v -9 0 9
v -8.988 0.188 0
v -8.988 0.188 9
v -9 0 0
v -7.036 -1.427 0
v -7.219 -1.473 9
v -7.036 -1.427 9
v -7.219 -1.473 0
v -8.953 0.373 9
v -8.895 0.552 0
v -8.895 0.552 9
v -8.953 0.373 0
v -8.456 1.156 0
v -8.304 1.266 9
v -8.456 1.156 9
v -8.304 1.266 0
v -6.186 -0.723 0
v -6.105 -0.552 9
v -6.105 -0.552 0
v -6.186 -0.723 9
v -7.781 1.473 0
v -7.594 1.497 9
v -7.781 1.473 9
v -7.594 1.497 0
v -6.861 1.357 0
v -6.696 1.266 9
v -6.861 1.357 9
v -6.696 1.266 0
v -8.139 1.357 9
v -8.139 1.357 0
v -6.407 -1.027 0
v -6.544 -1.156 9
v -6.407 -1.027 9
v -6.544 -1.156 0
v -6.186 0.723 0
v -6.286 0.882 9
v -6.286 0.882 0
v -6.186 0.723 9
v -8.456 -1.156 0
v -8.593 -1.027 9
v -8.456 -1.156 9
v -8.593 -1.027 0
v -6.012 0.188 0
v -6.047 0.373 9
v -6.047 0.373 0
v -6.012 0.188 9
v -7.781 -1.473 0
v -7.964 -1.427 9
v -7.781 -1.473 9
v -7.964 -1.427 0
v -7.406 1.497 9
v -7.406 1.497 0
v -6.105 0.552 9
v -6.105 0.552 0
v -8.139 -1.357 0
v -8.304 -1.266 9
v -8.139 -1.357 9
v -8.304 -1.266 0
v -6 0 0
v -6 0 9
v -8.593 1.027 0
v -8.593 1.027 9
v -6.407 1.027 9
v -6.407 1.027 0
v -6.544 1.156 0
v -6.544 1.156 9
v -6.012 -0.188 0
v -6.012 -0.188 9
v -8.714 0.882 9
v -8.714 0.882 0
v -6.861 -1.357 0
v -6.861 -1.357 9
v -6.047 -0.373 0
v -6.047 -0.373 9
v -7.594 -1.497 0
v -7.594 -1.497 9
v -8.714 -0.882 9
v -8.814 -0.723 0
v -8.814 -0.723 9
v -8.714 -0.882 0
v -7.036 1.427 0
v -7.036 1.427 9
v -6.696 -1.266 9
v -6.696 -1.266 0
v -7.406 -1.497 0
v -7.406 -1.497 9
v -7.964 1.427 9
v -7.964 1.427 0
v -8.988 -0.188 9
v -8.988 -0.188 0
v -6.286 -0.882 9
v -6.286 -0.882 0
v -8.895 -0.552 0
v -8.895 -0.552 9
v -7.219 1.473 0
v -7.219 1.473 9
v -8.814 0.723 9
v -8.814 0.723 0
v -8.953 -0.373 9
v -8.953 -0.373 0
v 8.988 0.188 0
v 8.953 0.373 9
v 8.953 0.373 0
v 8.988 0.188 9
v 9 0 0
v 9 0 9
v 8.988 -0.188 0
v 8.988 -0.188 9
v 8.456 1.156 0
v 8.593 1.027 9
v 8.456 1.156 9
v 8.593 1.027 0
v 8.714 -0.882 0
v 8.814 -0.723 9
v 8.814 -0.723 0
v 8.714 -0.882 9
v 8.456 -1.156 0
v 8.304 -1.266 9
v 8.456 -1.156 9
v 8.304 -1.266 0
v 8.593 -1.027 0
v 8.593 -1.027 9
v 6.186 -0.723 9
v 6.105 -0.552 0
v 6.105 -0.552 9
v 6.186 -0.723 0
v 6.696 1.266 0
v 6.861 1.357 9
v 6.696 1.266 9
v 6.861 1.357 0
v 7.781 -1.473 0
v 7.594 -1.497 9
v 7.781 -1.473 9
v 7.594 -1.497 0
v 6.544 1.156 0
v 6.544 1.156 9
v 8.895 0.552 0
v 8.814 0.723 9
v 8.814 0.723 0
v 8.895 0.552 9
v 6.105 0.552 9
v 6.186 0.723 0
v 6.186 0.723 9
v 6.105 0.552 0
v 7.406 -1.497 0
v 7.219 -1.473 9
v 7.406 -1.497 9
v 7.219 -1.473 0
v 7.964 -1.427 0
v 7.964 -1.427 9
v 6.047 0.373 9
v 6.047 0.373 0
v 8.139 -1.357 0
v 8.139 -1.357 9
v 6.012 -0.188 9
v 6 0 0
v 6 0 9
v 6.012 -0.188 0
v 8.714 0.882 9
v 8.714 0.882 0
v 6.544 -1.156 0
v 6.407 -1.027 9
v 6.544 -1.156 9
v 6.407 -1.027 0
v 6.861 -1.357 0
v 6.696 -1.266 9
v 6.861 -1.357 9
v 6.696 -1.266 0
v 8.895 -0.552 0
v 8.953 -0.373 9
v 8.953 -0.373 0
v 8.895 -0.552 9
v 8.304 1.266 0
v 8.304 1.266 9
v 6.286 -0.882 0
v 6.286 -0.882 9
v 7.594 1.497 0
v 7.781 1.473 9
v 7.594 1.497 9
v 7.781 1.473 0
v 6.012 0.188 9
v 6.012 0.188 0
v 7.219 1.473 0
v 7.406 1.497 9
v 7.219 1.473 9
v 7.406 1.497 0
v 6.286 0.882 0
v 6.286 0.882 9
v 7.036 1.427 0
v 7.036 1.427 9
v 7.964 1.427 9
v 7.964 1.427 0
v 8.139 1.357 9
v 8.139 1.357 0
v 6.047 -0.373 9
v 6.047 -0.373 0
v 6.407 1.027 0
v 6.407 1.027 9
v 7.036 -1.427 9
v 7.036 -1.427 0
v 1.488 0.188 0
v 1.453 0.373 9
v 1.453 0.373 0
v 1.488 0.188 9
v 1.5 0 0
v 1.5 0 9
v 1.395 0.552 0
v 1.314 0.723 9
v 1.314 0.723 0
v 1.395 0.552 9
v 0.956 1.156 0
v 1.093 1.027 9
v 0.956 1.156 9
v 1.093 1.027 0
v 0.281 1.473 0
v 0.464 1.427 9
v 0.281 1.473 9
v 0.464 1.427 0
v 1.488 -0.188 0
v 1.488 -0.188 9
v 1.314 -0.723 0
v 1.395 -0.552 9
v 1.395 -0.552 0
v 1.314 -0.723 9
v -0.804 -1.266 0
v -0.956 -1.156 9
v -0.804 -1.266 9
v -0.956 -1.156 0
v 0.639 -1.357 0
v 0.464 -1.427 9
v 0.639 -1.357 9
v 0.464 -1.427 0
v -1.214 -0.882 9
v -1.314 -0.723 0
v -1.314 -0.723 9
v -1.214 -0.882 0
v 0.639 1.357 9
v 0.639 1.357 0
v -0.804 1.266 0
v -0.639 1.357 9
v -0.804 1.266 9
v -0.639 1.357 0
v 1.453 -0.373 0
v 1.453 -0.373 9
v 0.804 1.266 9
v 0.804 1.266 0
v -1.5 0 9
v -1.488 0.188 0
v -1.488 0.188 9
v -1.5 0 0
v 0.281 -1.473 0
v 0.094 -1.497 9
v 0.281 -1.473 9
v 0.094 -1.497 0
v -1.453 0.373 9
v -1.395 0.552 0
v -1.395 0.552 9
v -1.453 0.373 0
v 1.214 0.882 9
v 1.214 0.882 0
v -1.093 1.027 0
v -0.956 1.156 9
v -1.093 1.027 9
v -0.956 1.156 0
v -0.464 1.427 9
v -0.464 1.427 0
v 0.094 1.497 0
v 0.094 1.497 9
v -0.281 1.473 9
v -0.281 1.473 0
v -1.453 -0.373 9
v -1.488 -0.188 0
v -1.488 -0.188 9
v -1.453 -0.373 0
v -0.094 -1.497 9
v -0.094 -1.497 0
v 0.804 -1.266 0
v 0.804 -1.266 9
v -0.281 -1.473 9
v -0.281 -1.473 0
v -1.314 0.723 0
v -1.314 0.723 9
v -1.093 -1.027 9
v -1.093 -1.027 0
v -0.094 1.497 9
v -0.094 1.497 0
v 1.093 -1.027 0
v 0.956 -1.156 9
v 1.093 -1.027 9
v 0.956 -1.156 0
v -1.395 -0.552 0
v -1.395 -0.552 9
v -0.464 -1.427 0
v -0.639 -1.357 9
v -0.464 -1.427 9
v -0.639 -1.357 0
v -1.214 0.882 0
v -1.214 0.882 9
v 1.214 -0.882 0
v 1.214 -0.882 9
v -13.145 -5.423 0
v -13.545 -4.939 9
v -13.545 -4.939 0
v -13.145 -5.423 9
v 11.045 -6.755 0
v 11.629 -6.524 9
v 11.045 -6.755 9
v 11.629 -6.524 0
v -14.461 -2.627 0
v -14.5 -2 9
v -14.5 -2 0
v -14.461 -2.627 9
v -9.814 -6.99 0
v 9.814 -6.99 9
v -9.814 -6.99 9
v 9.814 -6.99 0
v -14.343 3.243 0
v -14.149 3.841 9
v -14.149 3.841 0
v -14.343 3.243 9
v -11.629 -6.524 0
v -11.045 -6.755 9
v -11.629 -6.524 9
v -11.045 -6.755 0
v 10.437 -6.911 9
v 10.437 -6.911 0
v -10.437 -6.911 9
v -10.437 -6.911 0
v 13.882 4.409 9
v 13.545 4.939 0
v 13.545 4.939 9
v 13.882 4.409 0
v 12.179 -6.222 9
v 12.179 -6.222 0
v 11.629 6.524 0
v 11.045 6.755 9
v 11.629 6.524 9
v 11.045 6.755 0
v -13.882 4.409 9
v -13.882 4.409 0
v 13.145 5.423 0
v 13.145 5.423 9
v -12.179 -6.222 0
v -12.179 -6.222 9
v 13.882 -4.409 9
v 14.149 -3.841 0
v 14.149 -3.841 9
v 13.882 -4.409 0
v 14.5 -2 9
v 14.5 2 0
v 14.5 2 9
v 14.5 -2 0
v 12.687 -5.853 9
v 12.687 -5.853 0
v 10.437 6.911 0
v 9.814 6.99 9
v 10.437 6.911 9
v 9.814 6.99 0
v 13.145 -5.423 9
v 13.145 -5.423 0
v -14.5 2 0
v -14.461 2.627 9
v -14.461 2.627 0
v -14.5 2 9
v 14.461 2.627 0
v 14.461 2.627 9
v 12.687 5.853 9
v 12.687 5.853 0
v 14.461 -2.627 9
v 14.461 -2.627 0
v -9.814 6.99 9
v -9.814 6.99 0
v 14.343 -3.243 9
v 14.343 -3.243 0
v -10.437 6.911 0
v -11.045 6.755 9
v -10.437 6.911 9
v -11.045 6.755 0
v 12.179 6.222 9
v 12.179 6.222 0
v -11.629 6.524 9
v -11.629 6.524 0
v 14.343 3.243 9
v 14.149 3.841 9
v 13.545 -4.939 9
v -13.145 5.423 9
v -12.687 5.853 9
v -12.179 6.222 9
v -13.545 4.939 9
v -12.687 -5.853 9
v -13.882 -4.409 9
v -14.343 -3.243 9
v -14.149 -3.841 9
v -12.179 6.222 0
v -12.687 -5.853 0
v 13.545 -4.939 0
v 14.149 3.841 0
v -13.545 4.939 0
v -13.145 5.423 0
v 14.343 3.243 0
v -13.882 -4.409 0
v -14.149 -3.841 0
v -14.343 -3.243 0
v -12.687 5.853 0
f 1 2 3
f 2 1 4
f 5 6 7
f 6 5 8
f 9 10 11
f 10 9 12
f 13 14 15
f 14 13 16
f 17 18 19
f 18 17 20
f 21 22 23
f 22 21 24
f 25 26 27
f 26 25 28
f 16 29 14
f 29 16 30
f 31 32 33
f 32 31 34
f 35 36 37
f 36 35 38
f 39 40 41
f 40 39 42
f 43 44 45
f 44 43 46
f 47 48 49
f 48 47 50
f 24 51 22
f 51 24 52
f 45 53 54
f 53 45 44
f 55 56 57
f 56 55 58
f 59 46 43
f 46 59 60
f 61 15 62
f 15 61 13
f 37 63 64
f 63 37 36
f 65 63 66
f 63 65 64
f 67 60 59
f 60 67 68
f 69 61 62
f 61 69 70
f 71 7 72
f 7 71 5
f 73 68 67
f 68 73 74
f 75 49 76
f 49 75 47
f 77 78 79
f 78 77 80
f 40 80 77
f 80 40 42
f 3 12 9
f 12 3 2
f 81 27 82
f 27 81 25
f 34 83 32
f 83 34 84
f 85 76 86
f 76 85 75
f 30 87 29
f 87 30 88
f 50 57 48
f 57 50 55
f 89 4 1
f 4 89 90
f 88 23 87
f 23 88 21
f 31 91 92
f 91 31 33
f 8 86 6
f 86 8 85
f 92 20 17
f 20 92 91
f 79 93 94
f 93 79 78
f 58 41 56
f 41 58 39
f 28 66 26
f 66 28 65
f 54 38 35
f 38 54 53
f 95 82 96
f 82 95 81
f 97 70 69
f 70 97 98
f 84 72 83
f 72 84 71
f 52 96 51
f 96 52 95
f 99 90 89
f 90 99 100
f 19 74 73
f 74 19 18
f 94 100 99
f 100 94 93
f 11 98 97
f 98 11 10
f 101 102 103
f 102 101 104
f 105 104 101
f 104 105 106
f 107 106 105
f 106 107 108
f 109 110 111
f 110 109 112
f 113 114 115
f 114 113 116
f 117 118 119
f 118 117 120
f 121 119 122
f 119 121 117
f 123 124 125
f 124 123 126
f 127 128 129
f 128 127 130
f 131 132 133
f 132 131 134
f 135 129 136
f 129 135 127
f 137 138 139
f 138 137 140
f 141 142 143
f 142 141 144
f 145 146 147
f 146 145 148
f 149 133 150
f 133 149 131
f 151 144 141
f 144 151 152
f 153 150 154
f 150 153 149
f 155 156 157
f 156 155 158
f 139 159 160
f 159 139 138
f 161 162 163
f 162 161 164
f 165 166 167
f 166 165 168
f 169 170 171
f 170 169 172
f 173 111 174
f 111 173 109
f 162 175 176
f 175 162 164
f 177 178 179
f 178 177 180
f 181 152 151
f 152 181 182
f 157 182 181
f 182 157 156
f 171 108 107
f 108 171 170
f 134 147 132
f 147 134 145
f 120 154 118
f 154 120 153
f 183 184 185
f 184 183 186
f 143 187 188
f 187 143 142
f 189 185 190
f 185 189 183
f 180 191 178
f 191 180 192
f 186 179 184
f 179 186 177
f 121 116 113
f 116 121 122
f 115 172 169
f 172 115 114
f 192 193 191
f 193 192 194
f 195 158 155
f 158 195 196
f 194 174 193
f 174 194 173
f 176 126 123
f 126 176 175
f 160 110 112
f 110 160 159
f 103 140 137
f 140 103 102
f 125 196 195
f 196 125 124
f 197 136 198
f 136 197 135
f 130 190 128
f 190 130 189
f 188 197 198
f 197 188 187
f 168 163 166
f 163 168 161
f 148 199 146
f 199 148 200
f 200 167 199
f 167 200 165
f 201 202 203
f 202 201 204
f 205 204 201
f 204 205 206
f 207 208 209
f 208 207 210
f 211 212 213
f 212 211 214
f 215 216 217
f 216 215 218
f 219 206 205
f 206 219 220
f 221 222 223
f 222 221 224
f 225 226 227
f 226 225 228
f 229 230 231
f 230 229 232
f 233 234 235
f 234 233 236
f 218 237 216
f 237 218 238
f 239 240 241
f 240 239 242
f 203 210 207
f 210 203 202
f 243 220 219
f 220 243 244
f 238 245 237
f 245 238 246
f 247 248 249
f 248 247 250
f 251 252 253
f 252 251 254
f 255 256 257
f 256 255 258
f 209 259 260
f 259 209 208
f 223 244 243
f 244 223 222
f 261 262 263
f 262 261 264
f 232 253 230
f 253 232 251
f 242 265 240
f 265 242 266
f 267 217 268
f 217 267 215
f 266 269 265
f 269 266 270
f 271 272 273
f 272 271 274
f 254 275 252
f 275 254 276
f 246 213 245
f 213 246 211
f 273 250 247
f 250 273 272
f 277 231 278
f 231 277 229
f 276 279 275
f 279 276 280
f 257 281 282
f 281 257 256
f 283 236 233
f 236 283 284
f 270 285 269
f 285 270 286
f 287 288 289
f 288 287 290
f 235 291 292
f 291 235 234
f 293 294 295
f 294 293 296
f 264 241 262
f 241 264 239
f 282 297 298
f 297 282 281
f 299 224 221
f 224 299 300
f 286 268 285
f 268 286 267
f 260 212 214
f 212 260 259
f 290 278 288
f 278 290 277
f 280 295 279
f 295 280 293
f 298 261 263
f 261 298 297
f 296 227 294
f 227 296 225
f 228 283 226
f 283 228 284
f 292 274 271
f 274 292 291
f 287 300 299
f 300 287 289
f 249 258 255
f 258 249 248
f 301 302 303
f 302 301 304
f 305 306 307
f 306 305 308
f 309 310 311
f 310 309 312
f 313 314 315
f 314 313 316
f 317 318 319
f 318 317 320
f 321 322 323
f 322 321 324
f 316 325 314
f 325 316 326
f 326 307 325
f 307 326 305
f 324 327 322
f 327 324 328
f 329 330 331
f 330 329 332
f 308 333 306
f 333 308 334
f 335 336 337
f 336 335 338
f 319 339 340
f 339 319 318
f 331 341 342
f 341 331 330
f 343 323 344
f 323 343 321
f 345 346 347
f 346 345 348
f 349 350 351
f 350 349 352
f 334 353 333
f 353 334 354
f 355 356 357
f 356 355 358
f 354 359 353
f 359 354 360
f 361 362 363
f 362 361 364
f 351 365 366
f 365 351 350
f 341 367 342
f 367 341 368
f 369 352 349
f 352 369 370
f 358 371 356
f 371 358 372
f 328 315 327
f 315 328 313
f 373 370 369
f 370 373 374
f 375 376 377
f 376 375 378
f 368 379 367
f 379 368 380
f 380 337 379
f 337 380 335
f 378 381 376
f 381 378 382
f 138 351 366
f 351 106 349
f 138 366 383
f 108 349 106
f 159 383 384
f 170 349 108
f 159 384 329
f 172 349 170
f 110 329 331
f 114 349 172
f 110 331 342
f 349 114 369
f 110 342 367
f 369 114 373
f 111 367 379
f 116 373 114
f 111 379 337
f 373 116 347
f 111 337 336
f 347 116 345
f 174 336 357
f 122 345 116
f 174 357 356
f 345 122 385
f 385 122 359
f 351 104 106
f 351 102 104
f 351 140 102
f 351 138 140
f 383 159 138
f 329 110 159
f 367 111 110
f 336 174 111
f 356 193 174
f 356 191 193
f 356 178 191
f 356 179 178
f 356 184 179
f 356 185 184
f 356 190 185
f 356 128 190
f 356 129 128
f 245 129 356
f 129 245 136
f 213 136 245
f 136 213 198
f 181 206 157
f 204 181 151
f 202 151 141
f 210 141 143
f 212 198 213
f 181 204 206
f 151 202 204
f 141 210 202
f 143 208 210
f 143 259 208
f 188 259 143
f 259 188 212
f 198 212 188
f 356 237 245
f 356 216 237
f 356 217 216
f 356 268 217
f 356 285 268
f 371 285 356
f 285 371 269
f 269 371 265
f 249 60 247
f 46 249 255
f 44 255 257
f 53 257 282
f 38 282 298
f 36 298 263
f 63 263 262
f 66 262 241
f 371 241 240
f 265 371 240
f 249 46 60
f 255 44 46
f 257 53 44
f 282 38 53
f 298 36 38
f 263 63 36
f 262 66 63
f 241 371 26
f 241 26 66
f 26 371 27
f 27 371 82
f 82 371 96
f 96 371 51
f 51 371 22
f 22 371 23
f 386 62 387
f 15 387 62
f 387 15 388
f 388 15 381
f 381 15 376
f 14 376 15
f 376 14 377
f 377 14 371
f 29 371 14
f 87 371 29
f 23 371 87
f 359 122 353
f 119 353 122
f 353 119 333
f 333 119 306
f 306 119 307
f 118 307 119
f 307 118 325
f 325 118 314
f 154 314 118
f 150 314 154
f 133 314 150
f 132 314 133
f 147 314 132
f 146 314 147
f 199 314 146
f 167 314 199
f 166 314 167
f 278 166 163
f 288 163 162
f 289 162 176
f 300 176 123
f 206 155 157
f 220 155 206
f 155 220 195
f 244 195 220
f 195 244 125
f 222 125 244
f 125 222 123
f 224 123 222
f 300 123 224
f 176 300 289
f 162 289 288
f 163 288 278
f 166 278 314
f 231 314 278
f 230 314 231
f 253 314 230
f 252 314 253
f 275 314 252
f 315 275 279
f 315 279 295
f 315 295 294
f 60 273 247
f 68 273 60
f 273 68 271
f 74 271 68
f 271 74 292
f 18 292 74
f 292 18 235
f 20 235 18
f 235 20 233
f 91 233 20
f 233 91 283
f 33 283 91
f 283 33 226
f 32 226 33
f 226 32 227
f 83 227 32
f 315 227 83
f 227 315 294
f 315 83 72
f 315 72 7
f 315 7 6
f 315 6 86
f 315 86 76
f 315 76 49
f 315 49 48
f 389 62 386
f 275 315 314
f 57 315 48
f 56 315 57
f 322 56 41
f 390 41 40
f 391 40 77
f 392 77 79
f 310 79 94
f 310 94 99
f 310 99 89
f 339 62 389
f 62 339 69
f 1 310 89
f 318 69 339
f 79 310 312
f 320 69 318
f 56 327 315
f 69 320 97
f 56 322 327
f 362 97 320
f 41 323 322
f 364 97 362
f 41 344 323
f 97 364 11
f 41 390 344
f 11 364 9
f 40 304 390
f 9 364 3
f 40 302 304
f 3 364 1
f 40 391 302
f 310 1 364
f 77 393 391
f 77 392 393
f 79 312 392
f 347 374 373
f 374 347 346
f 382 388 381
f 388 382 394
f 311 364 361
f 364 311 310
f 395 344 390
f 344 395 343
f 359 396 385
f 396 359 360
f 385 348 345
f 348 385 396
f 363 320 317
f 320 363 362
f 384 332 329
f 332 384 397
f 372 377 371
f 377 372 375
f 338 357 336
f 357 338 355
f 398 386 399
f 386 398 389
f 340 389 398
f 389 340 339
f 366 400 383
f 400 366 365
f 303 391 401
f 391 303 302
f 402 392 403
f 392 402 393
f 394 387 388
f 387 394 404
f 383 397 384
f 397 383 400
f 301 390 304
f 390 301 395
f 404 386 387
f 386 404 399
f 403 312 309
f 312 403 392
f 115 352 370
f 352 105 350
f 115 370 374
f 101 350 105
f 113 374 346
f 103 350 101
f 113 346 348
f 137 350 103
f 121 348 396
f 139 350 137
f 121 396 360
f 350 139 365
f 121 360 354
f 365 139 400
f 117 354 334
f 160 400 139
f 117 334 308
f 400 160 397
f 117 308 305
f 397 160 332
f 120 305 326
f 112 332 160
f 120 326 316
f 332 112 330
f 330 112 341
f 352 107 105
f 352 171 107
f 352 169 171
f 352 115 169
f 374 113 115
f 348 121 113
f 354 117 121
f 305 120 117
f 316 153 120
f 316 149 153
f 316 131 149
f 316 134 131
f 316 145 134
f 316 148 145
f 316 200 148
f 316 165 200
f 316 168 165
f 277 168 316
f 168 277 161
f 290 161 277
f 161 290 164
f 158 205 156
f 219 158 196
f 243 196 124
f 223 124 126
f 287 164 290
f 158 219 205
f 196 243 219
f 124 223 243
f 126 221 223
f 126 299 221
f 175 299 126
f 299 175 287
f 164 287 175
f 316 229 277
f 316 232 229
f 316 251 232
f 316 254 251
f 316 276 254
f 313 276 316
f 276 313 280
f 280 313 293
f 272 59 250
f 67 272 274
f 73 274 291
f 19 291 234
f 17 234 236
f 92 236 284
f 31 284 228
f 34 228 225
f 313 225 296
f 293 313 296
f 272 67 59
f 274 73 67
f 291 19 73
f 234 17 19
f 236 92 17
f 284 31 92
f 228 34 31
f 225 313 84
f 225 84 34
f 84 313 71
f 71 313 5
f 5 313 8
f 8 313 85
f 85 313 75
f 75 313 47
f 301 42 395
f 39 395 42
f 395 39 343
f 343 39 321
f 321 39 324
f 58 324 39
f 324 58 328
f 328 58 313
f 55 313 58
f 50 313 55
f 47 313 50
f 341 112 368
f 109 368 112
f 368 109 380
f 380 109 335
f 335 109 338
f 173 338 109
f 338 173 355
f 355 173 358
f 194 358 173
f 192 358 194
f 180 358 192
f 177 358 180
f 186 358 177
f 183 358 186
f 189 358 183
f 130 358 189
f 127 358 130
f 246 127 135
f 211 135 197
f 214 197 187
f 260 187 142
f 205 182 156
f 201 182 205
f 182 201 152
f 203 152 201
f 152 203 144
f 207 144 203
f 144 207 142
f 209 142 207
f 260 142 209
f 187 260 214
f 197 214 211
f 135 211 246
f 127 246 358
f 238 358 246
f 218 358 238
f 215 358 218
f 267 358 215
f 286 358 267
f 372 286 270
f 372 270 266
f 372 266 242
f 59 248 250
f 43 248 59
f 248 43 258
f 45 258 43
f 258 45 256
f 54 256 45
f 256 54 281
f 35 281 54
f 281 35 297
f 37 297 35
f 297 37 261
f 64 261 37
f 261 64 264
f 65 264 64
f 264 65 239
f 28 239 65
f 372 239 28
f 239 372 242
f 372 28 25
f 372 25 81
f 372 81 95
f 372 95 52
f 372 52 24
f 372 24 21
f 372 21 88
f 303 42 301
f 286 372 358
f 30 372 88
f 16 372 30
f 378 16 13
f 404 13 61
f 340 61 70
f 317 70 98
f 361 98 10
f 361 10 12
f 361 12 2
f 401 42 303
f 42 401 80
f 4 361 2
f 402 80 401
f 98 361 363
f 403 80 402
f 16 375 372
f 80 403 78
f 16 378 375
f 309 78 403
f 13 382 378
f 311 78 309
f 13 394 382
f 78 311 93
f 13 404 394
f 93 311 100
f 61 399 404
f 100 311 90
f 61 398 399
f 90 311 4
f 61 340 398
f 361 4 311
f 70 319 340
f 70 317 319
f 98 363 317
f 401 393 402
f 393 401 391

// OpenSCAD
$fn = 50;


difference() {
	union() {
		hull() {
			translate(v = [-9.5000000000, 2.0000000000, 0]) {
				cylinder(h = 9, r = 5);
			}
			translate(v = [9.5000000000, 2.0000000000, 0]) {
				cylinder(h = 9, r = 5);
			}
			translate(v = [-9.5000000000, -2.0000000000, 0]) {
				cylinder(h = 9, r = 5);
			}
			translate(v = [9.5000000000, -2.0000000000, 0]) {
				cylinder(h = 9, r = 5);
			}
		}
	}
	union() {
		translate(v = [-7.5000000000, 0.0000000000, 0]) {
			translate(v = [0, 0, -100]) {
				cylinder(h = 200, r = 1.5000000000);
			}
		}
		translate(v = [7.5000000000, 0.0000000000, 0]) {
			translate(v = [0, 0, -100]) {
				cylinder(h = 200, r = 1.5000000000);
			}
		}
		translate(v = [-7.5000000000, 0.0000000000, 0]) {
			translate(v = [0, 0, -100]) {
				cylinder(h = 200, r = 1.5000000000);
			}
		}
		translate(v = [0, 0, -100]) {
			cylinder(h = 200, r = 1.5000000000);
		}
		translate(v = [7.5000000000, 0.0000000000, 0]) {
			translate(v = [0, 0, -100]) {
				cylinder(h = 200, r = 1.5000000000);
			}
		}
	}
}
